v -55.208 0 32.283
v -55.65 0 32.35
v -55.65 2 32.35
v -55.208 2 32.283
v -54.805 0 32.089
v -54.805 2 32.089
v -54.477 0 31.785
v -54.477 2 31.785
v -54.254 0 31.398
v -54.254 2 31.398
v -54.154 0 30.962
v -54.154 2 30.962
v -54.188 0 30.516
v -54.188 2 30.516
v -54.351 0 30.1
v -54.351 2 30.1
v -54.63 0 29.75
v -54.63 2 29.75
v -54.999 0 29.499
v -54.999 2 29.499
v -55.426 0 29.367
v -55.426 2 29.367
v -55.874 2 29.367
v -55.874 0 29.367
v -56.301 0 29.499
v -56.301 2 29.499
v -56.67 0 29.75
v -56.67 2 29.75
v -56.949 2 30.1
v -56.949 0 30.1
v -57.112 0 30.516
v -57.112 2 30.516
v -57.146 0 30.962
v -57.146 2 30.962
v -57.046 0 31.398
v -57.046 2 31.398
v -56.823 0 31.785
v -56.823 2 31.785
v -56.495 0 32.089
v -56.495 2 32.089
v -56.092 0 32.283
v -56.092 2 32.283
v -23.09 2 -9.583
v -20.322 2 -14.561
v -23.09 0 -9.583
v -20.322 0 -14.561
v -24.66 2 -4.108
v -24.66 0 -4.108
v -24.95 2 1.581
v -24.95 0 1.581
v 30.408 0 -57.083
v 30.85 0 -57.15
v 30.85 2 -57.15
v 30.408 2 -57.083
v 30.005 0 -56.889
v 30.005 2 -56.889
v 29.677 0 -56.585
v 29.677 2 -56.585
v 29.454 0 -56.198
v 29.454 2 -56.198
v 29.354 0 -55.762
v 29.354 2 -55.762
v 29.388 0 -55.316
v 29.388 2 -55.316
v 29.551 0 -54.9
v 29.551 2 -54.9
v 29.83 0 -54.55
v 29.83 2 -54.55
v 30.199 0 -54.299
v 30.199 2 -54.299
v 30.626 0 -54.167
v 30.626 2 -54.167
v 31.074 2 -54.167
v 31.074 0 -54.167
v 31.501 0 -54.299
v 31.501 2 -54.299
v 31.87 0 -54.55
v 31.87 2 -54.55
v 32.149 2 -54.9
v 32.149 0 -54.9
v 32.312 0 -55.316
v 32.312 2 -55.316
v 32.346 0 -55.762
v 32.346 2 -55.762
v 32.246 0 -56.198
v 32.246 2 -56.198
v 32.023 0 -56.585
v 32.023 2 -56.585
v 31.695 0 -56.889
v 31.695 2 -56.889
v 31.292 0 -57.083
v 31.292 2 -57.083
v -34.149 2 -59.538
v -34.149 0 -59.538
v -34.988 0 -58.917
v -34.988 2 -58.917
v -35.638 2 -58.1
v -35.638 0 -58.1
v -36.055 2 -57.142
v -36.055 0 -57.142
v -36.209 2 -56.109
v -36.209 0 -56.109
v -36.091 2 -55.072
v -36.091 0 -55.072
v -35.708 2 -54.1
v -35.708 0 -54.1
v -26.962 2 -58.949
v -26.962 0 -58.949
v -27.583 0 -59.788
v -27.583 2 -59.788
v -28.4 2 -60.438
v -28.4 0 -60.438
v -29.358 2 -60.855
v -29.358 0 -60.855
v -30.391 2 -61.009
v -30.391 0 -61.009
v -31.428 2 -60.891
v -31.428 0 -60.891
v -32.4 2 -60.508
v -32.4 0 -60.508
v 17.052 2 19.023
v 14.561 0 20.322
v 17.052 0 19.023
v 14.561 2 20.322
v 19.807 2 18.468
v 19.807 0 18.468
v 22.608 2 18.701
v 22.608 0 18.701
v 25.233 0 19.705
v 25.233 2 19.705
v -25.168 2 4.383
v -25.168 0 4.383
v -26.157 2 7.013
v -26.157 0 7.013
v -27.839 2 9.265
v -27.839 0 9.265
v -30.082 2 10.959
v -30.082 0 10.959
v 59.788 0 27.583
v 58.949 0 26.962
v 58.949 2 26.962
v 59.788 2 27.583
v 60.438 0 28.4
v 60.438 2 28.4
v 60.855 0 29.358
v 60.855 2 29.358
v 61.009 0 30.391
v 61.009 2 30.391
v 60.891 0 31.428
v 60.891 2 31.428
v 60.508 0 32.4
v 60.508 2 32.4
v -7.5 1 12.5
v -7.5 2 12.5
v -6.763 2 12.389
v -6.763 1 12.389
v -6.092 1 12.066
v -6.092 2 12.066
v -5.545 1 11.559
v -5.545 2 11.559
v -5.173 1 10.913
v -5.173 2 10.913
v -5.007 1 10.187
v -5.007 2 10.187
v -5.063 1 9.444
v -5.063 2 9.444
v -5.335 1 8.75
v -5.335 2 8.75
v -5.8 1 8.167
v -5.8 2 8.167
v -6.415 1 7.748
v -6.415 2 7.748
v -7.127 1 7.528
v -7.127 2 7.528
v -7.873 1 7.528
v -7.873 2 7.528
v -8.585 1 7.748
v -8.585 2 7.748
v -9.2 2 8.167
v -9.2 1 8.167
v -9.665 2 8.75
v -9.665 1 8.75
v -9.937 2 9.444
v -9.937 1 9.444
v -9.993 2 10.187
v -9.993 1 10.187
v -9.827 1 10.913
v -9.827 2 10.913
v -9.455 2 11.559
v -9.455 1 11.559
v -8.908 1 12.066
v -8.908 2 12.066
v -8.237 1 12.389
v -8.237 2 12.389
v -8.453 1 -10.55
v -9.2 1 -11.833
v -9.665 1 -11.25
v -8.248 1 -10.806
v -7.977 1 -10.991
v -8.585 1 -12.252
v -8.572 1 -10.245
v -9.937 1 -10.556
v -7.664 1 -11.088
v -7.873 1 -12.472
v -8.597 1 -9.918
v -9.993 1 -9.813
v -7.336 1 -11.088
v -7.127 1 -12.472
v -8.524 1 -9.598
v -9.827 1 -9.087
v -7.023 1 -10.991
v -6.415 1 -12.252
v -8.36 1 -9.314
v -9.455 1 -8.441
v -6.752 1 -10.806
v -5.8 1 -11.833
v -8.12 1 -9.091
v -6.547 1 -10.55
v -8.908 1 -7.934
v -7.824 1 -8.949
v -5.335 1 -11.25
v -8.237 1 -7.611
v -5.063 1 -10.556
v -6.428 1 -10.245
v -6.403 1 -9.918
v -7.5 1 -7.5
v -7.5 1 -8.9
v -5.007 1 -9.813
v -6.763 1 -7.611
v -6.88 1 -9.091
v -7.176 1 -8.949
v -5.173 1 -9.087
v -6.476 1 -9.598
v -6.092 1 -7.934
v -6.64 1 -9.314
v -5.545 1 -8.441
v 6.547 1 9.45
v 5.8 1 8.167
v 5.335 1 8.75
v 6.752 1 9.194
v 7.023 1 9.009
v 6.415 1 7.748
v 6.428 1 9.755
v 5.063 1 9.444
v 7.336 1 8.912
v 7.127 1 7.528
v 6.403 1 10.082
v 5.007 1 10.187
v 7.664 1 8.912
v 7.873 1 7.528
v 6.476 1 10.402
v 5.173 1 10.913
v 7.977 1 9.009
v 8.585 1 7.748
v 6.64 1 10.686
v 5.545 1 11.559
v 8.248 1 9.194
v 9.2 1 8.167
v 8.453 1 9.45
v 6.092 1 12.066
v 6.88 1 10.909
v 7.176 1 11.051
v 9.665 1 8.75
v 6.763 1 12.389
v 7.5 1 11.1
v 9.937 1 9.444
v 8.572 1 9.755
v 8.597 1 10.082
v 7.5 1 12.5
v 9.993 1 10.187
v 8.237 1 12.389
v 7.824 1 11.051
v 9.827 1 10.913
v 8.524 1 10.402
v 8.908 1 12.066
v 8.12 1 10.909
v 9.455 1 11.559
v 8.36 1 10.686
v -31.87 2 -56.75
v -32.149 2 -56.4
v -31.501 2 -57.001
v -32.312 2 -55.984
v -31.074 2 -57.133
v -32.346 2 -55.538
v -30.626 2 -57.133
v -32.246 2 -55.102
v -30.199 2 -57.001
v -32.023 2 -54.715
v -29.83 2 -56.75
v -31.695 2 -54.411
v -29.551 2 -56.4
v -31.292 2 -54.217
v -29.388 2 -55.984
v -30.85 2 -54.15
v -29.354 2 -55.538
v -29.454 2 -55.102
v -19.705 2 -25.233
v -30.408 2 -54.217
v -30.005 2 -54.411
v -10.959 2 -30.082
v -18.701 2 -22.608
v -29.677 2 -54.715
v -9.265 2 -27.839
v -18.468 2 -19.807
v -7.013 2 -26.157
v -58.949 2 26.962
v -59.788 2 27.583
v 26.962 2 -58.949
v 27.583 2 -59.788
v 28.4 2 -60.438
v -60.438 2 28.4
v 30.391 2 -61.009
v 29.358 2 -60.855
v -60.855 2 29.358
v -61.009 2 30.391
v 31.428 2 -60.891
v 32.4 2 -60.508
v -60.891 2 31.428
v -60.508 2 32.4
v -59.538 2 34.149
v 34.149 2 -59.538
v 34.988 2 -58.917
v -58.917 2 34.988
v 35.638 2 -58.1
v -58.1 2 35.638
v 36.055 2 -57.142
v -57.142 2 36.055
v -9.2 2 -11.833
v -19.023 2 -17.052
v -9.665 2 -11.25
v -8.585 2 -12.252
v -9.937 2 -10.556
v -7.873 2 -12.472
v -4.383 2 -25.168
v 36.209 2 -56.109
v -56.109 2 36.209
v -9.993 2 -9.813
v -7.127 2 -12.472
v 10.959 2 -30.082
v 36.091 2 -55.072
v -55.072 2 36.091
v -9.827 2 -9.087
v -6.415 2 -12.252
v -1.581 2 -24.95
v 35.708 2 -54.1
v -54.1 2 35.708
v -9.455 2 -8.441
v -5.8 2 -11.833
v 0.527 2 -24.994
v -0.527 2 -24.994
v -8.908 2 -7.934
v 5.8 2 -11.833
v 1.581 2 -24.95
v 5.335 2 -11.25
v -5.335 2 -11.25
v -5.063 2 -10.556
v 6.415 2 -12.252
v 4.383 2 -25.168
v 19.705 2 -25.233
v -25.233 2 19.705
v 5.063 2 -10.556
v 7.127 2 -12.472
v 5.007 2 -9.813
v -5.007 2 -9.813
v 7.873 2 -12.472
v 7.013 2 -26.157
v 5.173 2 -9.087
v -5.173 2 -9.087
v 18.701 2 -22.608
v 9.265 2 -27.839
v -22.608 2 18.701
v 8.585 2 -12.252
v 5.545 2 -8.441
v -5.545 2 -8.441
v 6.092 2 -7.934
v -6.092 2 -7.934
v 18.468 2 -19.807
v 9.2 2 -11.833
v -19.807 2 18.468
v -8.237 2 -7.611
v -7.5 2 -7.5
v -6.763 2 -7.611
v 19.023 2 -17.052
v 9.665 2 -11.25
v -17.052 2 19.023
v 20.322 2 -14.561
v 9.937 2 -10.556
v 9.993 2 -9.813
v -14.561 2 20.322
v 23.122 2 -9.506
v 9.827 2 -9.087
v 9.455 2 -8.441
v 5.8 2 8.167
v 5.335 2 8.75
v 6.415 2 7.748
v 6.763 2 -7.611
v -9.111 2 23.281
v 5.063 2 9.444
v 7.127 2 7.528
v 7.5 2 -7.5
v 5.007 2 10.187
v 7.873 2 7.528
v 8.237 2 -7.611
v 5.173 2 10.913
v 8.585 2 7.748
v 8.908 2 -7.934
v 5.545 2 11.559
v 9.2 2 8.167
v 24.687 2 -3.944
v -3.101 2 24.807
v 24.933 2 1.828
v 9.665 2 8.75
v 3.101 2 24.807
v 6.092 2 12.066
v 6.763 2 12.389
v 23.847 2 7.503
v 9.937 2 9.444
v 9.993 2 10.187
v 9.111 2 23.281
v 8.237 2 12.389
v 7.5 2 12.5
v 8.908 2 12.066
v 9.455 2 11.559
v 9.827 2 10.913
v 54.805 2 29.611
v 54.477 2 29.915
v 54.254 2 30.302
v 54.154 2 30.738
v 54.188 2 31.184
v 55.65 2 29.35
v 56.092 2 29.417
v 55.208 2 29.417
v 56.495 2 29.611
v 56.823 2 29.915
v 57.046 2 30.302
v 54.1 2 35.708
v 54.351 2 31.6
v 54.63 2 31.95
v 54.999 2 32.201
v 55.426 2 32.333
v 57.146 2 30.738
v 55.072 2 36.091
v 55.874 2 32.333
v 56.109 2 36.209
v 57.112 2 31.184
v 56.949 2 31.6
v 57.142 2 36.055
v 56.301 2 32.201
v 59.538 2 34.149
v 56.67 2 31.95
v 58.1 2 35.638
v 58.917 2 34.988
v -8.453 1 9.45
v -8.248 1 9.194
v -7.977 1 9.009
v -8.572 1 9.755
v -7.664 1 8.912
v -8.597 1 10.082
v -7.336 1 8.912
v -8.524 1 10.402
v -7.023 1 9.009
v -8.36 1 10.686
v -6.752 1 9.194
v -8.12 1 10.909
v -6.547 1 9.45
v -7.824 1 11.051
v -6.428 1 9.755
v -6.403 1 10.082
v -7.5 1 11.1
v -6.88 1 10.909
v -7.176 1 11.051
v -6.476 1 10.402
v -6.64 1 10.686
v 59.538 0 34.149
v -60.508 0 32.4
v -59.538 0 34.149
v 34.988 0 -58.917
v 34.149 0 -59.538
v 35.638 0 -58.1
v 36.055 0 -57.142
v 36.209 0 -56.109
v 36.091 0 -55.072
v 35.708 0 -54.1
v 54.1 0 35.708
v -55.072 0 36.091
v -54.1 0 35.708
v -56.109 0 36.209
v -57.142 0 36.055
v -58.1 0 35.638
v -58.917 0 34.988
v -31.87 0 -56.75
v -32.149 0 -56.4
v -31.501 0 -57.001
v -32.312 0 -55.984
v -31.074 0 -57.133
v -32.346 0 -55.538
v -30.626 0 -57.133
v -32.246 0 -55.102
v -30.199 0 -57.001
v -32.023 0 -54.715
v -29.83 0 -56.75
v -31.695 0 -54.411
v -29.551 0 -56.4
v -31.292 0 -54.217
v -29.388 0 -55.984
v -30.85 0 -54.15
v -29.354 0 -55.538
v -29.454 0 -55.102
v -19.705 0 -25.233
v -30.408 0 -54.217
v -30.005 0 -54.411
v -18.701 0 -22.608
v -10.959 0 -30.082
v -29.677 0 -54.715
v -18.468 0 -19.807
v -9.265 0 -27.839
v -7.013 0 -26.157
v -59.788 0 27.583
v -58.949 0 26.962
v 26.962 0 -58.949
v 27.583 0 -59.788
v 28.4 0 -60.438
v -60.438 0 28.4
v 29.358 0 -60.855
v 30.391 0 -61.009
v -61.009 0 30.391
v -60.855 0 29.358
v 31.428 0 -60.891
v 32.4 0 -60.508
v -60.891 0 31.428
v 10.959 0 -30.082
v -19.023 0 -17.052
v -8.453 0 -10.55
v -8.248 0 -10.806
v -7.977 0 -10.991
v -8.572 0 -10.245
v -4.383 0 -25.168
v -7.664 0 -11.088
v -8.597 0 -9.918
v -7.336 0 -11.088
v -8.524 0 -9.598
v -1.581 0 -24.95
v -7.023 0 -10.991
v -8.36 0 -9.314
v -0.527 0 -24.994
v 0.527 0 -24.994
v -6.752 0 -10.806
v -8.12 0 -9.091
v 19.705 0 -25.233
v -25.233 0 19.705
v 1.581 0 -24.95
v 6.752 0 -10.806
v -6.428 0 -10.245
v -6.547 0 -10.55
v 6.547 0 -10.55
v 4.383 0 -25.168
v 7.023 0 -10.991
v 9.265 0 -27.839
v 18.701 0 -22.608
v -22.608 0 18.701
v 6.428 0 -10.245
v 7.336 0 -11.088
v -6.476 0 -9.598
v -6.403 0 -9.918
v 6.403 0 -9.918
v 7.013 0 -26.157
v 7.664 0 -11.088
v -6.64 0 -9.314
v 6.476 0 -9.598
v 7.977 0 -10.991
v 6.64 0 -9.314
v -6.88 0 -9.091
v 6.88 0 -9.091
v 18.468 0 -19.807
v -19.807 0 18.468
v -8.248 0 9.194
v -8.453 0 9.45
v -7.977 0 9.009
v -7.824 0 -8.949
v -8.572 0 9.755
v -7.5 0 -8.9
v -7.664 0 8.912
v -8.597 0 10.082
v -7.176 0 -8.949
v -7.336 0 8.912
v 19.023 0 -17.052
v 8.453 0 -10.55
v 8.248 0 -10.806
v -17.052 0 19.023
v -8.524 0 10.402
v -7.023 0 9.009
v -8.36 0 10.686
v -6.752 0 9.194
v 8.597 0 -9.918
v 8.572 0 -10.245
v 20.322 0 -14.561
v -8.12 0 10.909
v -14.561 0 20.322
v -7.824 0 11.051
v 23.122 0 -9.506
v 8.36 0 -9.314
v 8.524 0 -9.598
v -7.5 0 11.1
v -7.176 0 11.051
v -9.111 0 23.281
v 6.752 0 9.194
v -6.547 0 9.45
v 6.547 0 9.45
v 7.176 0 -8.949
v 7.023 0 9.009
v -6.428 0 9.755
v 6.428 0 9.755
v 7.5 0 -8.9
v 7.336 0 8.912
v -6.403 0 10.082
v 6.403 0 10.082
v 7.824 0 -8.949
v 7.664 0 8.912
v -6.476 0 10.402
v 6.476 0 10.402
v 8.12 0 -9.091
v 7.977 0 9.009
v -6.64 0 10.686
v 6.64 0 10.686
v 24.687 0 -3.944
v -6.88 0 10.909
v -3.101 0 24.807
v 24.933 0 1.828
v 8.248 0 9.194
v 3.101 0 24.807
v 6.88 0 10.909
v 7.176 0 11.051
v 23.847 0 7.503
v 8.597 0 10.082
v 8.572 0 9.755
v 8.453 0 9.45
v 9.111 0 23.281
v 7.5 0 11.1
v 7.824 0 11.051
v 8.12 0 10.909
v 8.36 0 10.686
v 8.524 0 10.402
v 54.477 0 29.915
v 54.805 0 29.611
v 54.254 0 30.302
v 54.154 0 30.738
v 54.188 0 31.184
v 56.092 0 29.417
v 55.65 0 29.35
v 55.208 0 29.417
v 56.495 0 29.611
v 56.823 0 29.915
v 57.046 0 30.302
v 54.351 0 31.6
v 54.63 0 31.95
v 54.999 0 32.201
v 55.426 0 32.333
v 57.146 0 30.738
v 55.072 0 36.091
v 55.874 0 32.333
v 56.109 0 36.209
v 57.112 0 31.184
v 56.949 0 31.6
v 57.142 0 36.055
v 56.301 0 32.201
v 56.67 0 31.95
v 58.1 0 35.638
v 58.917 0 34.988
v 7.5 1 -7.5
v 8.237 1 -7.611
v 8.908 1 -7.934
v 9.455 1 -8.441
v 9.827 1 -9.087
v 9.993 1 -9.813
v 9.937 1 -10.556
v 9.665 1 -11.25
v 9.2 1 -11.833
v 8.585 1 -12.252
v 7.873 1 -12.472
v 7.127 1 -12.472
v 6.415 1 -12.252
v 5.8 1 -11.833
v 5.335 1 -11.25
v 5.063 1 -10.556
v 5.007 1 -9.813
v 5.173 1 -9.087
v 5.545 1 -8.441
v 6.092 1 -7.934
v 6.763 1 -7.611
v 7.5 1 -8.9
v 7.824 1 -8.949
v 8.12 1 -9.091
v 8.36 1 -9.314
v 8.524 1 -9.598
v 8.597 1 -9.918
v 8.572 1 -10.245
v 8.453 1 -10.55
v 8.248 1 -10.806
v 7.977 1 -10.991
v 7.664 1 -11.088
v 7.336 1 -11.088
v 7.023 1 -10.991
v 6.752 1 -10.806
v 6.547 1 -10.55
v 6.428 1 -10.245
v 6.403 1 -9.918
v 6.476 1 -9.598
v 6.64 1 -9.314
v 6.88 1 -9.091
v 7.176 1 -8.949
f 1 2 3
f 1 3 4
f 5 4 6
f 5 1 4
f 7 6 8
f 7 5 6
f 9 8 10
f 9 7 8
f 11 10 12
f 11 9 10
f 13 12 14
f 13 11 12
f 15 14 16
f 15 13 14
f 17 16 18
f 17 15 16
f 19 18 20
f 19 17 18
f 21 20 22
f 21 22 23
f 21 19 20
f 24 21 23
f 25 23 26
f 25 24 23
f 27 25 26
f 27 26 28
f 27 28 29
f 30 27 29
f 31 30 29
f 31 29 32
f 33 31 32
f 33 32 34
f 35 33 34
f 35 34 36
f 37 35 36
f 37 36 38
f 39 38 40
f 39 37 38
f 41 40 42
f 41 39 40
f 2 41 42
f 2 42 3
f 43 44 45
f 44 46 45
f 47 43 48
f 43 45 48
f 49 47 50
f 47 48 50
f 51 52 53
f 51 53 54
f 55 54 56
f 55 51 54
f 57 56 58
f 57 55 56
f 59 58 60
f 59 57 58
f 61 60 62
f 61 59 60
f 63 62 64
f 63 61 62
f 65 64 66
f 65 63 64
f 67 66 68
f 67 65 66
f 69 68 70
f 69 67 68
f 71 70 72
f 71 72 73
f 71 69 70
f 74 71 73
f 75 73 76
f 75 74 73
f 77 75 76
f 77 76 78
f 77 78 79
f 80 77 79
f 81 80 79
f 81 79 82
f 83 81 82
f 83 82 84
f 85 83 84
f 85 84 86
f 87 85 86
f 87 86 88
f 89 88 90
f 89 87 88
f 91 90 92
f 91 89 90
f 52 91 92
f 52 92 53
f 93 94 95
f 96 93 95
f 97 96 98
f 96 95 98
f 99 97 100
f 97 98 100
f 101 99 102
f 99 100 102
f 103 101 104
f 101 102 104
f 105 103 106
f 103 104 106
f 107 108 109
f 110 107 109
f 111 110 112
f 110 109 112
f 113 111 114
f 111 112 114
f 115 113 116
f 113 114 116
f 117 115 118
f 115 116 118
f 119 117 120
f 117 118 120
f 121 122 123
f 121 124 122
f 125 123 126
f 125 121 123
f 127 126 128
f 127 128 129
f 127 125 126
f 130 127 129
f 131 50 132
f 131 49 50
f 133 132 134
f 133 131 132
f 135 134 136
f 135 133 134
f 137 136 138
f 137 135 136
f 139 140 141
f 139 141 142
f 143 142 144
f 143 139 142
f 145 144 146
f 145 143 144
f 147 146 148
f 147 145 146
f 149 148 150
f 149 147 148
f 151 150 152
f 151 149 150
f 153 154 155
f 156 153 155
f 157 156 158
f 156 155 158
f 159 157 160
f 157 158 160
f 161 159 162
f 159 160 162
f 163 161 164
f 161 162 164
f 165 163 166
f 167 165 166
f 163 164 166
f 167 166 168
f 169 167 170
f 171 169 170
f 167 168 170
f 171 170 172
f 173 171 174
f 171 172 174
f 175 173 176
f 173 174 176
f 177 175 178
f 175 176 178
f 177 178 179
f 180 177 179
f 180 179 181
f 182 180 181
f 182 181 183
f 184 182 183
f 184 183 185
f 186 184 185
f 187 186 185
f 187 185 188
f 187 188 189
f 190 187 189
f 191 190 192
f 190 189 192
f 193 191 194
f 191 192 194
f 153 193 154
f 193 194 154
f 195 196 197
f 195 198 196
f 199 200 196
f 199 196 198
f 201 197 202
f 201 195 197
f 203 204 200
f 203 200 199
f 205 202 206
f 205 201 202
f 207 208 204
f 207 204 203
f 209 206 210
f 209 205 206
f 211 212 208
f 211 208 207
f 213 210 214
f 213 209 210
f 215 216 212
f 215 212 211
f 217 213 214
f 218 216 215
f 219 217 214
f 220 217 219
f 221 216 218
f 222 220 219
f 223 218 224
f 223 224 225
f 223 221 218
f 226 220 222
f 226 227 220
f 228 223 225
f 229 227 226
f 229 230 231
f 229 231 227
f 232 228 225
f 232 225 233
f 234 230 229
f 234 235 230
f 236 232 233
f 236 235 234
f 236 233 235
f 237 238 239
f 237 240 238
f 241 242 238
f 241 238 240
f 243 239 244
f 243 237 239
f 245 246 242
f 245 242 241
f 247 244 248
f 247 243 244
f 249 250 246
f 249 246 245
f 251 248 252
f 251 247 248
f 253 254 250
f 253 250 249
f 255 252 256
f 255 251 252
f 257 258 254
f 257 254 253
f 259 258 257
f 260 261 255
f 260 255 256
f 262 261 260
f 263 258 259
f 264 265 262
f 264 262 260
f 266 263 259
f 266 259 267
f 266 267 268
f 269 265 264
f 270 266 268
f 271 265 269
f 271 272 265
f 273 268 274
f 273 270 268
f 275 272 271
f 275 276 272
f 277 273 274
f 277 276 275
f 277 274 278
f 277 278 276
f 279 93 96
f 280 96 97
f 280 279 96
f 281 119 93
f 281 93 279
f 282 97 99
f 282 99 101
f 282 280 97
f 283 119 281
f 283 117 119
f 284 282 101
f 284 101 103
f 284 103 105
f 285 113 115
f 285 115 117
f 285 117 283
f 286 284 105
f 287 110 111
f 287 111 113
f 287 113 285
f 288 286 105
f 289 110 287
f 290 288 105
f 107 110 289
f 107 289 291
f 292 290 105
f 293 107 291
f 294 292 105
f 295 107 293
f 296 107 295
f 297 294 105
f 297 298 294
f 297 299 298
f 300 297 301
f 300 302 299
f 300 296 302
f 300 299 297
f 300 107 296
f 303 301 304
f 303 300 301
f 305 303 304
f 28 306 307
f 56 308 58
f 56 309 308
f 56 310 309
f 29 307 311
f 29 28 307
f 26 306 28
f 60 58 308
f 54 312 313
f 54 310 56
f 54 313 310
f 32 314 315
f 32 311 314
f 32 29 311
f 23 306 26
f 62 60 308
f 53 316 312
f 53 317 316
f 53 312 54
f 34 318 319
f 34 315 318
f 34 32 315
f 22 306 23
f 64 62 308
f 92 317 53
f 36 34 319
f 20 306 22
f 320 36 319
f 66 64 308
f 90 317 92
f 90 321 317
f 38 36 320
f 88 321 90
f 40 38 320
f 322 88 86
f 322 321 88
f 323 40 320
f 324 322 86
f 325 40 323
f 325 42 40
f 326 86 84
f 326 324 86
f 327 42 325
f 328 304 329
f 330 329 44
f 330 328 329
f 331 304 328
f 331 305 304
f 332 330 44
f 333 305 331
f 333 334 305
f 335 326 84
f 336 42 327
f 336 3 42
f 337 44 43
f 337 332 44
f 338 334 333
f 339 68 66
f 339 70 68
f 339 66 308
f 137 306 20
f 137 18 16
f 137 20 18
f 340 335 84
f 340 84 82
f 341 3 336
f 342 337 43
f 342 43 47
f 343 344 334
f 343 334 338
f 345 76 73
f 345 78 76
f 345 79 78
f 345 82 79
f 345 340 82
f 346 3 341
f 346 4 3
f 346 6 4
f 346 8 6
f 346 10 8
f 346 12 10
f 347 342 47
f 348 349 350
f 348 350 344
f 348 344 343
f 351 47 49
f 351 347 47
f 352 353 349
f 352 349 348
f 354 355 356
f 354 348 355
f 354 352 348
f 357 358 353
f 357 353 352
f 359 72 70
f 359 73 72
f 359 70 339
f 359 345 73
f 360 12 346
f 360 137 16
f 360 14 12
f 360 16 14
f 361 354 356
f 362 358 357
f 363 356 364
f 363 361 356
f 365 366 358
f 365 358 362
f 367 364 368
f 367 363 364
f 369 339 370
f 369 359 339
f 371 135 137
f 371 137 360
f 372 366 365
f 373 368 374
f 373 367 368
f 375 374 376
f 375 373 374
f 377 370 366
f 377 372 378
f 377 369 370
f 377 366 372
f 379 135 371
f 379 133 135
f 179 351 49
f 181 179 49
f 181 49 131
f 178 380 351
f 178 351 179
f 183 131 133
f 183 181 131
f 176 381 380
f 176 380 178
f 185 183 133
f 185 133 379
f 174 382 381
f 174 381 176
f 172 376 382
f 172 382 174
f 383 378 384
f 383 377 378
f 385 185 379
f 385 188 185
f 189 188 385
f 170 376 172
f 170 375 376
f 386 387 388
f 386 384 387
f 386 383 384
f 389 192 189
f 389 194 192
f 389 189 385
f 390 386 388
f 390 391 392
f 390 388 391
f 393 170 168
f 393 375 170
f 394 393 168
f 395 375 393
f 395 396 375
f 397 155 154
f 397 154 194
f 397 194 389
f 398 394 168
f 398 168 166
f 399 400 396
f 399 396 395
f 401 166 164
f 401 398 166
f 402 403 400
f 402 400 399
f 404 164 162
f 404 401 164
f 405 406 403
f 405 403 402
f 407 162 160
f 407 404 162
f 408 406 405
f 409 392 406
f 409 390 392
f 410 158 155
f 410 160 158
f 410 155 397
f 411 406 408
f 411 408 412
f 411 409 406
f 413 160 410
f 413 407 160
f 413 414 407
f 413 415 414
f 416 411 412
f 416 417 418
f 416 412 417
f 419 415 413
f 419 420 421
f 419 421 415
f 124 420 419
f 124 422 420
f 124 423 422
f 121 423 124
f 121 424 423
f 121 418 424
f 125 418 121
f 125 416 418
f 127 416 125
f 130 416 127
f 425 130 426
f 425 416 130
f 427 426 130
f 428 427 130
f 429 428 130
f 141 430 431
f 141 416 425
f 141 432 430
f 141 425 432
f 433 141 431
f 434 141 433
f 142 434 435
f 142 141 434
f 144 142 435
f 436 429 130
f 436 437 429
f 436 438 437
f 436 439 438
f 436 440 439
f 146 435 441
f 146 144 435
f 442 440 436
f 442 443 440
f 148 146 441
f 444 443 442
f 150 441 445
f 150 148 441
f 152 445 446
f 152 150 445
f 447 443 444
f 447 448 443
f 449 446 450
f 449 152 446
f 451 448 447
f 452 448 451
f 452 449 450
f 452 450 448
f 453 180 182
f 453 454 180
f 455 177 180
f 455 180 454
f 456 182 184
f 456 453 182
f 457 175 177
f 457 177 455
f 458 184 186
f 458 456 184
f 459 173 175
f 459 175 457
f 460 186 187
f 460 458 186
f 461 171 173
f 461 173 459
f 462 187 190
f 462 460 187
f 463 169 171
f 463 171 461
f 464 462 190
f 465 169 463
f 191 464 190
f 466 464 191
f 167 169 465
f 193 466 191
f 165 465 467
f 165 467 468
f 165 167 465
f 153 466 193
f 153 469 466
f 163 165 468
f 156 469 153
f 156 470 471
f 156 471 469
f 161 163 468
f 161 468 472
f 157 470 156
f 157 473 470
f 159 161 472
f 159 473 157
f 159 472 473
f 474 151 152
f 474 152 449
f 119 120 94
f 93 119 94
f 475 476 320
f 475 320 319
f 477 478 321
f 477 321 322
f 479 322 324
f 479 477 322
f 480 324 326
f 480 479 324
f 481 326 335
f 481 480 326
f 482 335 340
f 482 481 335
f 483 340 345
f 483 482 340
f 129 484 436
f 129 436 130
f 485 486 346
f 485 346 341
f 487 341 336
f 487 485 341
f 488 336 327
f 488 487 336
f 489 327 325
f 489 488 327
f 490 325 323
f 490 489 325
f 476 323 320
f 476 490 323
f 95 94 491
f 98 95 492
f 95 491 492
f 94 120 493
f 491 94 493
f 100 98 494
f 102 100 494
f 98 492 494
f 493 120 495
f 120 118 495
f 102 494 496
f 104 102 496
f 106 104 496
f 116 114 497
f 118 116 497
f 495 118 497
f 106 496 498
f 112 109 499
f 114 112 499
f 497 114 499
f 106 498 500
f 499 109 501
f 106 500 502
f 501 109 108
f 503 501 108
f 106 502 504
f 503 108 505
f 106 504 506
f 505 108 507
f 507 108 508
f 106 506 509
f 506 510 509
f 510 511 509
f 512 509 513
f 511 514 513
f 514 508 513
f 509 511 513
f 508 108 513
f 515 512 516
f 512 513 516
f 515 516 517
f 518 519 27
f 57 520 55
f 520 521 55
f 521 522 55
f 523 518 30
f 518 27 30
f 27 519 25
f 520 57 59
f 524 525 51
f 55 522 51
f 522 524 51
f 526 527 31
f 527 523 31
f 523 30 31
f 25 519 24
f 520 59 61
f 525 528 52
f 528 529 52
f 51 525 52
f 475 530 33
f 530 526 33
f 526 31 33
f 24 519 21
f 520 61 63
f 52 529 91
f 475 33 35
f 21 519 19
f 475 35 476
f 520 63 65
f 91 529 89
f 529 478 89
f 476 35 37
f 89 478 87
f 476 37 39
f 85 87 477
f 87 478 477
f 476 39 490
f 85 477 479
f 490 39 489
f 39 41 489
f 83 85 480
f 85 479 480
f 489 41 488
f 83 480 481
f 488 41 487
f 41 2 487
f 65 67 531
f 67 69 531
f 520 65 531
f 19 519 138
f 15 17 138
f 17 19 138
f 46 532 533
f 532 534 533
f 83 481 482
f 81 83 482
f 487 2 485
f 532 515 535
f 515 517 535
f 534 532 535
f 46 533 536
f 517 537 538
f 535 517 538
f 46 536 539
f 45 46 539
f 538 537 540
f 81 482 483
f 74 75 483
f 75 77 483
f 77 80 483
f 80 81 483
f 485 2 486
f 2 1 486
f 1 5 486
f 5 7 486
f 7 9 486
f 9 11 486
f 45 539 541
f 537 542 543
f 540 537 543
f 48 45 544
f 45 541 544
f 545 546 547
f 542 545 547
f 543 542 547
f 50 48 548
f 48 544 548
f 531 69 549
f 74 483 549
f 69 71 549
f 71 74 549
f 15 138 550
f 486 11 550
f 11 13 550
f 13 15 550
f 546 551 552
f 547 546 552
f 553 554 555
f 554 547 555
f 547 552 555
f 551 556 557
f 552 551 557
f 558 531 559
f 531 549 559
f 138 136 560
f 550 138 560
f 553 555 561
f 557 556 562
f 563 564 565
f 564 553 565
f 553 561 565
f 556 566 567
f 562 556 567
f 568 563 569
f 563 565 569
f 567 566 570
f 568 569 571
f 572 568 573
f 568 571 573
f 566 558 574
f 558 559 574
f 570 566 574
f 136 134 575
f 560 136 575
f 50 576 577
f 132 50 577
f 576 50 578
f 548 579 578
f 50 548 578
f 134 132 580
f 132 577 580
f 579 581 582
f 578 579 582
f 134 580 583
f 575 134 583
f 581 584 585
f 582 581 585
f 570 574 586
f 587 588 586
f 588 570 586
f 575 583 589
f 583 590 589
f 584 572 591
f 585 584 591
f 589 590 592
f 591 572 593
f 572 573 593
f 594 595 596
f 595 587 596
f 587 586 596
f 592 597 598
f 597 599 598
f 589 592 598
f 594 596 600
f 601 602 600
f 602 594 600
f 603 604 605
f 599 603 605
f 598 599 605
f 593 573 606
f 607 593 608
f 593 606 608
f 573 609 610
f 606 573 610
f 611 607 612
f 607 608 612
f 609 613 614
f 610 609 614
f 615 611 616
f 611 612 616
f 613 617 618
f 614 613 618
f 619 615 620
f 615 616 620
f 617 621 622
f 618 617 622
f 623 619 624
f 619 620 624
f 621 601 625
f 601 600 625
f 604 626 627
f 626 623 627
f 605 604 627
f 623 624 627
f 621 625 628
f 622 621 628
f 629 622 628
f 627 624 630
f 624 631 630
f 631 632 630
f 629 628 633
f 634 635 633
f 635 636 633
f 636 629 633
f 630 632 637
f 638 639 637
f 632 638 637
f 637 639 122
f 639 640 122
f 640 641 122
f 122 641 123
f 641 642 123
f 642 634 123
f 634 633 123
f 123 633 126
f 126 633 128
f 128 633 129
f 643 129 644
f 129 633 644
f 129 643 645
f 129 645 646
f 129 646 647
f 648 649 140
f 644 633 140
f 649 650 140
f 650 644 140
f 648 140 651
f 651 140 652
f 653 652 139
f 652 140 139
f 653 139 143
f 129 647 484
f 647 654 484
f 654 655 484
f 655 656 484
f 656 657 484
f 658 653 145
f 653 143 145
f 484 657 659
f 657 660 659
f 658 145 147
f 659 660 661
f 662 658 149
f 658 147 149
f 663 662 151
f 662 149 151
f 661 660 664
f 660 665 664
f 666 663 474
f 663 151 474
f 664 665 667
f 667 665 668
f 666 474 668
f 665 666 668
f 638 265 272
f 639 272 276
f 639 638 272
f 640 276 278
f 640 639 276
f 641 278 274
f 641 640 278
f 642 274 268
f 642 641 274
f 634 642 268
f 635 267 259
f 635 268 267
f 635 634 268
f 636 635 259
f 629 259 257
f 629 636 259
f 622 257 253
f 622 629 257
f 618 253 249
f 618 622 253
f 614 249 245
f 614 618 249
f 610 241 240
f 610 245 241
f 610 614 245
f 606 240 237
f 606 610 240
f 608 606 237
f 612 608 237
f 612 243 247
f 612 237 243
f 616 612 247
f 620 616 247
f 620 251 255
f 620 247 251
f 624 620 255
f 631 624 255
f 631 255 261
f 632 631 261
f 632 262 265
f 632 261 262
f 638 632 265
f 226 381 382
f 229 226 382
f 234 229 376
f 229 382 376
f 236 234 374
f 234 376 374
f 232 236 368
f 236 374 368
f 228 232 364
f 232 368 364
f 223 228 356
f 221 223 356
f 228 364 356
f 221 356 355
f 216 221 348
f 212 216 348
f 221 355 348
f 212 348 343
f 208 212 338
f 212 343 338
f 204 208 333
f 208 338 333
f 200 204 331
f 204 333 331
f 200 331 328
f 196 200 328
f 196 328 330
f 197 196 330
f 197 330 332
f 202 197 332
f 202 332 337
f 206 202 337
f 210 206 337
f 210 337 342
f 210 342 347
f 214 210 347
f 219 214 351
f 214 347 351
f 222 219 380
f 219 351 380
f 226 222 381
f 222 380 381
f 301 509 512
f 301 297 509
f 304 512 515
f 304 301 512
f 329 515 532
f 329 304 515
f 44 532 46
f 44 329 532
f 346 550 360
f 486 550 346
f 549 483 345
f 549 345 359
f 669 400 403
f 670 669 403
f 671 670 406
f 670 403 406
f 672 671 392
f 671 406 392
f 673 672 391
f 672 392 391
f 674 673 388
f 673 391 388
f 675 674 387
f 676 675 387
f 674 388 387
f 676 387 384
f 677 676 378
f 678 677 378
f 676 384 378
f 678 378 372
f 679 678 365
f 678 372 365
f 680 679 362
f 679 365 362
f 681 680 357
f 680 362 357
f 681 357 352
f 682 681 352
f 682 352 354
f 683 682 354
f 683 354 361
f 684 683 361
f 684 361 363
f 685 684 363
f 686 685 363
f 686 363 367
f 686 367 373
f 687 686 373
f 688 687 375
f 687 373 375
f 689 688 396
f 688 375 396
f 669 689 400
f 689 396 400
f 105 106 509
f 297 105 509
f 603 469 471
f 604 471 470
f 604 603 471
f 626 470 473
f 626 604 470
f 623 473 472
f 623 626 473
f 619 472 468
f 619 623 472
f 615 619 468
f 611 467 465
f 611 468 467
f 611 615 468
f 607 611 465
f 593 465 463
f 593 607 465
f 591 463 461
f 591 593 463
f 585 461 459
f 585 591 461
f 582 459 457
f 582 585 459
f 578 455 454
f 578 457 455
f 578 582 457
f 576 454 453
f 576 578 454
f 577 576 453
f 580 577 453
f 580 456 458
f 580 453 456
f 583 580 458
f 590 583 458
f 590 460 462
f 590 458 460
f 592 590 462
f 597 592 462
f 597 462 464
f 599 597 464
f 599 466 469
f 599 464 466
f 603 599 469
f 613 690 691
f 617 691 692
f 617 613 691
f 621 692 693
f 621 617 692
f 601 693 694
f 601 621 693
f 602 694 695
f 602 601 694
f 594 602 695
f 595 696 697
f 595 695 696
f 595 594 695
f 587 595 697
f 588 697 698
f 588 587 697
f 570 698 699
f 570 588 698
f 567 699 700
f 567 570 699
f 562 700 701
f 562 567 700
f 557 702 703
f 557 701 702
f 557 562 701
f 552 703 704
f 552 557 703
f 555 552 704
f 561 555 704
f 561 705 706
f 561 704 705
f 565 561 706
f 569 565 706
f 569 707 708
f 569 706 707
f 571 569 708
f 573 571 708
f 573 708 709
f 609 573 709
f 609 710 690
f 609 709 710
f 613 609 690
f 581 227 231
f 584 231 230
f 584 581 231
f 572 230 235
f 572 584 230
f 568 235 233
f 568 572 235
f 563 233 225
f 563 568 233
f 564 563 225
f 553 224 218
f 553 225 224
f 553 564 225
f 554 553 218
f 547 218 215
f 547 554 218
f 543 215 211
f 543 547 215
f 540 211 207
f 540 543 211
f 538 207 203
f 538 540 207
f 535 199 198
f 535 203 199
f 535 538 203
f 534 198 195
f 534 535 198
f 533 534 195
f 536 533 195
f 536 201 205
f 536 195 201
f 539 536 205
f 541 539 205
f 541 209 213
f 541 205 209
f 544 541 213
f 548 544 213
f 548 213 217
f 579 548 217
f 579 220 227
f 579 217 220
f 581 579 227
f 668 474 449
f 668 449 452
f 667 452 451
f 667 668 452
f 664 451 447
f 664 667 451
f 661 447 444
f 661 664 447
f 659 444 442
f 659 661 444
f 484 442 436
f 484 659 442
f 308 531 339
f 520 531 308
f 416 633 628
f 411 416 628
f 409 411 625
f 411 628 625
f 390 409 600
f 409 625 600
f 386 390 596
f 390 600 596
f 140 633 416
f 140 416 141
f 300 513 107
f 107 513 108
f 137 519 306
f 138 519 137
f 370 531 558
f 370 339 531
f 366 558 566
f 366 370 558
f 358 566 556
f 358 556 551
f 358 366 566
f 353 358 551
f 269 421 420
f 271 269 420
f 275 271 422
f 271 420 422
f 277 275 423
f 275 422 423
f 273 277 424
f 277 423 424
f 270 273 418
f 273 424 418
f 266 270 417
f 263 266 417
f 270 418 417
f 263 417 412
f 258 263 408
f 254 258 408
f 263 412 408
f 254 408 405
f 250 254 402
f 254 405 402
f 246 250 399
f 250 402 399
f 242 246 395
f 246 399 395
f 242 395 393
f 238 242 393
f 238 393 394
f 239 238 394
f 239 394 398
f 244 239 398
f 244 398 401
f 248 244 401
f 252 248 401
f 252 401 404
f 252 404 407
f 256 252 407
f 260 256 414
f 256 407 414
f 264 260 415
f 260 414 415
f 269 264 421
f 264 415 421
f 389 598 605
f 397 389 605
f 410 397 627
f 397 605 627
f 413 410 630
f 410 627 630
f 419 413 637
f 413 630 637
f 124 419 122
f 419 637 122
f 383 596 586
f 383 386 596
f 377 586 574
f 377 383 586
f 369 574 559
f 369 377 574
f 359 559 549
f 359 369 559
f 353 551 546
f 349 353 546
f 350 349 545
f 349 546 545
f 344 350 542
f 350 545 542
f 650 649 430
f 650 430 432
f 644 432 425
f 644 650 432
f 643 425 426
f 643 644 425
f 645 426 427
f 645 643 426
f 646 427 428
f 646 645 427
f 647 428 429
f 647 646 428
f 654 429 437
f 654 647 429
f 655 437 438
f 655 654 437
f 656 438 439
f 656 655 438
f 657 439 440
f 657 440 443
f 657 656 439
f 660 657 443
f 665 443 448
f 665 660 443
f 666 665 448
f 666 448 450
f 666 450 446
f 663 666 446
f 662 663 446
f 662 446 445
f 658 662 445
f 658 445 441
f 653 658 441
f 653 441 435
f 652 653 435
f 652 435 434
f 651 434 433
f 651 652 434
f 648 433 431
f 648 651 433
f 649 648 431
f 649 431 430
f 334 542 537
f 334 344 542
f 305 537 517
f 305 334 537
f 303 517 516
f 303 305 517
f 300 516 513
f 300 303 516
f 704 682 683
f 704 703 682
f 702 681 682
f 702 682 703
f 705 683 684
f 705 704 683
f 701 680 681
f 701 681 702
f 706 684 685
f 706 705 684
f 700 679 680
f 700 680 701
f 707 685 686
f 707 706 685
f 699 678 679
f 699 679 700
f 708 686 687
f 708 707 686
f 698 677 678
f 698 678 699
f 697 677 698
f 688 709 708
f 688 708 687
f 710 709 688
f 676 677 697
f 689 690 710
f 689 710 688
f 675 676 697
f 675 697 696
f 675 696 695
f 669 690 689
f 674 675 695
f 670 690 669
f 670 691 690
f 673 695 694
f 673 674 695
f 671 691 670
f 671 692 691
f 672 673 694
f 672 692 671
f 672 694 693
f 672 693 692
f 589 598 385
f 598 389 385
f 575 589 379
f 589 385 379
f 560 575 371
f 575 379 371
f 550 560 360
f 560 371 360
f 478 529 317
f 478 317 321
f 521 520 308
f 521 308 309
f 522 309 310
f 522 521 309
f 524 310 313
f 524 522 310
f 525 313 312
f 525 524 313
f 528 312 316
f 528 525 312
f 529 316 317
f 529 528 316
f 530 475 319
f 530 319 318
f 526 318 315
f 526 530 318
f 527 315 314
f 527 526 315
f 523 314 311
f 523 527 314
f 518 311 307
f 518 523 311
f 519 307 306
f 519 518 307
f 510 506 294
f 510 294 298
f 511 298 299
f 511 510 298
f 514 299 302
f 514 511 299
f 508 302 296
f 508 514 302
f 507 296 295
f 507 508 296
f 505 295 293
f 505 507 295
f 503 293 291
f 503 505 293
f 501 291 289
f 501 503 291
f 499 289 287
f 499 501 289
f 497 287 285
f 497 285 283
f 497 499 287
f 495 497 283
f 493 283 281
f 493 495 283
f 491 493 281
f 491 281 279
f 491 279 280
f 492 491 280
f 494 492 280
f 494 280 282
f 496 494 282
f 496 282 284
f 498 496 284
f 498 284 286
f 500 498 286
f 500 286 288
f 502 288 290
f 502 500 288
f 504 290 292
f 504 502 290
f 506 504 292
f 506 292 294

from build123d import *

# Parameters (mm, degrees)
SKETCH1_R           = 25
SKETCH1_R_2         = 1.1
BOSS_EXTRUDE1_DEPTH = 2
SKETCH2_R           = 2.5
CUT_EXTRUDE1_DEPTH  = 1
SKETCH3_R           = 1.5
BOSS_EXTRUDE2_DEPTH = 2
FILLET1_R           = 10
FILLET2_R           = 10


with BuildPart() as part:
    # Sketch1 → Boss-Extrude1 (new body)
    with BuildSketch(Plane(origin=(0, 0, 0), x_dir=(1, 0, 0), z_dir=(0, 1, 0))):
        with Locations(Location((0, 0, 0), (0, 0, 270))):
            Circle(SKETCH1_R)
        with Locations(Location((-7.5, 10, 0), (0, 0, 270))):
            Circle(SKETCH1_R_2, mode=Mode.SUBTRACT)
        with Locations(Location((7.5, 10, 0), (0, 0, 270))):
            Circle(SKETCH1_R_2, mode=Mode.SUBTRACT)
        with Locations(Location((-7.5, -10, 0), (0, 0, 270))):
            Circle(SKETCH1_R_2, mode=Mode.SUBTRACT)
        with Locations(Location((7.5, -10, 0), (0, 0, 270))):
            Circle(SKETCH1_R_2, mode=Mode.SUBTRACT)
    extrude(amount=BOSS_EXTRUDE1_DEPTH)

    # Sketch2 → Cut-Extrude1 (cut)
    with BuildSketch(Plane(origin=(0, 2, 0), x_dir=(1, 0, 0), z_dir=(0, 1, 0))):
        with Locations(Location((-7.5, 10, 0), (0, 0, 270))):
            Circle(SKETCH2_R)
        with Locations(Location((7.5, 10, 0), (0, 0, 270))):
            Circle(SKETCH2_R)
        with Locations(Location((-7.5, -10, 0), (0, 0, 270))):
            Circle(SKETCH2_R)
        with Locations(Location((7.5, -10, 0), (0, 0, 270))):
            Circle(SKETCH2_R)
    extrude(amount=-CUT_EXTRUDE1_DEPTH, mode=Mode.SUBTRACT)

    # Sketch3 → Boss-Extrude2 (add)
    # profile 1 of 4: a face of its own
    with BuildSketch(Plane(origin=(0, 0, 0), x_dir=(1, 0, 0), z_dir=(0, 1, 0))):
        with BuildLine():
            Line((-7.503148867, 23.847489534), (-26.96183357, 58.948812182))
            ThreePointArc((-26.96183357, 58.948812182), (-29.357833738, 60.85453152), (-32.399608771, 60.507850621))
            Line((-32.399608771, 60.507850621), (-34.148812182, 59.53816643))
            ThreePointArc((-34.148812182, 59.53816643), (-36.05453152, 57.142166262), (-35.707850621, 54.100391229))
            Line((-35.707850621, 54.100391229), (-16.249165919, 18.999068581))
            ThreePointArc((-16.249165919, 18.999068581), (-12.121052382, 21.865042628), (-7.503148867, 23.847489534))
        make_face()
        with Locations(Location((-30.85, 55.65, 0), (0, 0, 270))):
            Circle(SKETCH3_R, mode=Mode.SUBTRACT)
    # profile 2 of 4: a face of its own
    with BuildSketch(Plane(origin=(0, 0, 0), x_dir=(1, 0, 0), z_dir=(0, 1, 0))):
        with BuildLine():
            Line((-58.948812182, -26.96183357), (-23.847489534, -7.503148867))
            ThreePointArc((-23.847489534, -7.503148867), (-21.865042628, -12.121052382), (-18.999068581, -16.249165919))
            Line((-18.999068581, -16.249165919), (-54.100391229, -35.707850621))
            ThreePointArc((-54.100391229, -35.707850621), (-57.142166262, -36.05453152), (-59.53816643, -34.148812182))
            Line((-59.53816643, -34.148812182), (-60.507850621, -32.399608771))
            ThreePointArc((-60.507850621, -32.399608771), (-60.85453152, -29.357833738), (-58.948812182, -26.96183357))
        make_face()
        with Locations(Location((-55.65, -30.85, 0), (0, 0, 270))):
            Circle(SKETCH3_R, mode=Mode.SUBTRACT)
    # profile 3 of 4: a face of its own
    with BuildSketch(Plane(origin=(0, 0, 0), x_dir=(1, 0, 0), z_dir=(0, 1, 0))):
        with BuildLine():
            Line((60.507850621, -32.399608771), (59.53816643, -34.148812182))
            ThreePointArc((59.53816643, -34.148812182), (57.142166262, -36.05453152), (54.100391229, -35.707850621))
            Line((54.100391229, -35.707850621), (18.999068581, -16.249165919))
            ThreePointArc((18.999068581, -16.249165919), (21.865042628, -12.121052382), (23.847489534, -7.503148867))
            Line((23.847489534, -7.503148867), (58.948812182, -26.96183357))
            ThreePointArc((58.948812182, -26.96183357), (60.85453152, -29.357833738), (60.507850621, -32.399608771))
        make_face()
        with Locations(Location((55.65, -30.85, 0), (0, 0, 90))):
            Circle(SKETCH3_R, mode=Mode.SUBTRACT)
    # profile 4 of 4: a face of its own
    with BuildSketch(Plane(origin=(0, 0, 0), x_dir=(1, 0, 0), z_dir=(0, 1, 0))):
        with BuildLine():
            Line((32.399608771, 60.507850621), (34.148812182, 59.53816643))
            ThreePointArc((34.148812182, 59.53816643), (36.05453152, 57.142166262), (35.707850621, 54.100391229))
            Line((35.707850621, 54.100391229), (16.249165919, 18.999068581))
            ThreePointArc((16.249165919, 18.999068581), (12.121052382, 21.865042628), (7.503148867, 23.847489534))
            Line((7.503148867, 23.847489534), (26.96183357, 58.948812182))
            ThreePointArc((26.96183357, 58.948812182), (29.357833738, 60.85453152), (32.399608771, 60.507850621))
        make_face()
        with Locations(Location((30.85, 55.65, 0), (0, 0, 90))):
            Circle(SKETCH3_R, mode=Mode.SUBTRACT)
    extrude(amount=BOSS_EXTRUDE2_DEPTH)

    # Fillet1
    fillet1_edges = [part.edges().sort_by_distance(p)[0] for p in [
        (-7.503148867, 1, -23.847489534),
        (-16.249165919, 1, -18.999068581),
        (-23.847489534, 1, 7.503148867),
        (-18.999068581, 1, 16.249165919),
        (18.999068581, 1, 16.249165919),
        (16.249165919, 1, -18.999068581),
    ]]
    fillet(fillet1_edges, radius=FILLET1_R)

    # Fillet2
    fillet2_edges = [part.edges().sort_by_distance(p)[0] for p in [
        (7.503148867, 1, -23.847489534),
    ]]
    fillet(fillet2_edges, radius=FILLET2_R)


solid = part.part
